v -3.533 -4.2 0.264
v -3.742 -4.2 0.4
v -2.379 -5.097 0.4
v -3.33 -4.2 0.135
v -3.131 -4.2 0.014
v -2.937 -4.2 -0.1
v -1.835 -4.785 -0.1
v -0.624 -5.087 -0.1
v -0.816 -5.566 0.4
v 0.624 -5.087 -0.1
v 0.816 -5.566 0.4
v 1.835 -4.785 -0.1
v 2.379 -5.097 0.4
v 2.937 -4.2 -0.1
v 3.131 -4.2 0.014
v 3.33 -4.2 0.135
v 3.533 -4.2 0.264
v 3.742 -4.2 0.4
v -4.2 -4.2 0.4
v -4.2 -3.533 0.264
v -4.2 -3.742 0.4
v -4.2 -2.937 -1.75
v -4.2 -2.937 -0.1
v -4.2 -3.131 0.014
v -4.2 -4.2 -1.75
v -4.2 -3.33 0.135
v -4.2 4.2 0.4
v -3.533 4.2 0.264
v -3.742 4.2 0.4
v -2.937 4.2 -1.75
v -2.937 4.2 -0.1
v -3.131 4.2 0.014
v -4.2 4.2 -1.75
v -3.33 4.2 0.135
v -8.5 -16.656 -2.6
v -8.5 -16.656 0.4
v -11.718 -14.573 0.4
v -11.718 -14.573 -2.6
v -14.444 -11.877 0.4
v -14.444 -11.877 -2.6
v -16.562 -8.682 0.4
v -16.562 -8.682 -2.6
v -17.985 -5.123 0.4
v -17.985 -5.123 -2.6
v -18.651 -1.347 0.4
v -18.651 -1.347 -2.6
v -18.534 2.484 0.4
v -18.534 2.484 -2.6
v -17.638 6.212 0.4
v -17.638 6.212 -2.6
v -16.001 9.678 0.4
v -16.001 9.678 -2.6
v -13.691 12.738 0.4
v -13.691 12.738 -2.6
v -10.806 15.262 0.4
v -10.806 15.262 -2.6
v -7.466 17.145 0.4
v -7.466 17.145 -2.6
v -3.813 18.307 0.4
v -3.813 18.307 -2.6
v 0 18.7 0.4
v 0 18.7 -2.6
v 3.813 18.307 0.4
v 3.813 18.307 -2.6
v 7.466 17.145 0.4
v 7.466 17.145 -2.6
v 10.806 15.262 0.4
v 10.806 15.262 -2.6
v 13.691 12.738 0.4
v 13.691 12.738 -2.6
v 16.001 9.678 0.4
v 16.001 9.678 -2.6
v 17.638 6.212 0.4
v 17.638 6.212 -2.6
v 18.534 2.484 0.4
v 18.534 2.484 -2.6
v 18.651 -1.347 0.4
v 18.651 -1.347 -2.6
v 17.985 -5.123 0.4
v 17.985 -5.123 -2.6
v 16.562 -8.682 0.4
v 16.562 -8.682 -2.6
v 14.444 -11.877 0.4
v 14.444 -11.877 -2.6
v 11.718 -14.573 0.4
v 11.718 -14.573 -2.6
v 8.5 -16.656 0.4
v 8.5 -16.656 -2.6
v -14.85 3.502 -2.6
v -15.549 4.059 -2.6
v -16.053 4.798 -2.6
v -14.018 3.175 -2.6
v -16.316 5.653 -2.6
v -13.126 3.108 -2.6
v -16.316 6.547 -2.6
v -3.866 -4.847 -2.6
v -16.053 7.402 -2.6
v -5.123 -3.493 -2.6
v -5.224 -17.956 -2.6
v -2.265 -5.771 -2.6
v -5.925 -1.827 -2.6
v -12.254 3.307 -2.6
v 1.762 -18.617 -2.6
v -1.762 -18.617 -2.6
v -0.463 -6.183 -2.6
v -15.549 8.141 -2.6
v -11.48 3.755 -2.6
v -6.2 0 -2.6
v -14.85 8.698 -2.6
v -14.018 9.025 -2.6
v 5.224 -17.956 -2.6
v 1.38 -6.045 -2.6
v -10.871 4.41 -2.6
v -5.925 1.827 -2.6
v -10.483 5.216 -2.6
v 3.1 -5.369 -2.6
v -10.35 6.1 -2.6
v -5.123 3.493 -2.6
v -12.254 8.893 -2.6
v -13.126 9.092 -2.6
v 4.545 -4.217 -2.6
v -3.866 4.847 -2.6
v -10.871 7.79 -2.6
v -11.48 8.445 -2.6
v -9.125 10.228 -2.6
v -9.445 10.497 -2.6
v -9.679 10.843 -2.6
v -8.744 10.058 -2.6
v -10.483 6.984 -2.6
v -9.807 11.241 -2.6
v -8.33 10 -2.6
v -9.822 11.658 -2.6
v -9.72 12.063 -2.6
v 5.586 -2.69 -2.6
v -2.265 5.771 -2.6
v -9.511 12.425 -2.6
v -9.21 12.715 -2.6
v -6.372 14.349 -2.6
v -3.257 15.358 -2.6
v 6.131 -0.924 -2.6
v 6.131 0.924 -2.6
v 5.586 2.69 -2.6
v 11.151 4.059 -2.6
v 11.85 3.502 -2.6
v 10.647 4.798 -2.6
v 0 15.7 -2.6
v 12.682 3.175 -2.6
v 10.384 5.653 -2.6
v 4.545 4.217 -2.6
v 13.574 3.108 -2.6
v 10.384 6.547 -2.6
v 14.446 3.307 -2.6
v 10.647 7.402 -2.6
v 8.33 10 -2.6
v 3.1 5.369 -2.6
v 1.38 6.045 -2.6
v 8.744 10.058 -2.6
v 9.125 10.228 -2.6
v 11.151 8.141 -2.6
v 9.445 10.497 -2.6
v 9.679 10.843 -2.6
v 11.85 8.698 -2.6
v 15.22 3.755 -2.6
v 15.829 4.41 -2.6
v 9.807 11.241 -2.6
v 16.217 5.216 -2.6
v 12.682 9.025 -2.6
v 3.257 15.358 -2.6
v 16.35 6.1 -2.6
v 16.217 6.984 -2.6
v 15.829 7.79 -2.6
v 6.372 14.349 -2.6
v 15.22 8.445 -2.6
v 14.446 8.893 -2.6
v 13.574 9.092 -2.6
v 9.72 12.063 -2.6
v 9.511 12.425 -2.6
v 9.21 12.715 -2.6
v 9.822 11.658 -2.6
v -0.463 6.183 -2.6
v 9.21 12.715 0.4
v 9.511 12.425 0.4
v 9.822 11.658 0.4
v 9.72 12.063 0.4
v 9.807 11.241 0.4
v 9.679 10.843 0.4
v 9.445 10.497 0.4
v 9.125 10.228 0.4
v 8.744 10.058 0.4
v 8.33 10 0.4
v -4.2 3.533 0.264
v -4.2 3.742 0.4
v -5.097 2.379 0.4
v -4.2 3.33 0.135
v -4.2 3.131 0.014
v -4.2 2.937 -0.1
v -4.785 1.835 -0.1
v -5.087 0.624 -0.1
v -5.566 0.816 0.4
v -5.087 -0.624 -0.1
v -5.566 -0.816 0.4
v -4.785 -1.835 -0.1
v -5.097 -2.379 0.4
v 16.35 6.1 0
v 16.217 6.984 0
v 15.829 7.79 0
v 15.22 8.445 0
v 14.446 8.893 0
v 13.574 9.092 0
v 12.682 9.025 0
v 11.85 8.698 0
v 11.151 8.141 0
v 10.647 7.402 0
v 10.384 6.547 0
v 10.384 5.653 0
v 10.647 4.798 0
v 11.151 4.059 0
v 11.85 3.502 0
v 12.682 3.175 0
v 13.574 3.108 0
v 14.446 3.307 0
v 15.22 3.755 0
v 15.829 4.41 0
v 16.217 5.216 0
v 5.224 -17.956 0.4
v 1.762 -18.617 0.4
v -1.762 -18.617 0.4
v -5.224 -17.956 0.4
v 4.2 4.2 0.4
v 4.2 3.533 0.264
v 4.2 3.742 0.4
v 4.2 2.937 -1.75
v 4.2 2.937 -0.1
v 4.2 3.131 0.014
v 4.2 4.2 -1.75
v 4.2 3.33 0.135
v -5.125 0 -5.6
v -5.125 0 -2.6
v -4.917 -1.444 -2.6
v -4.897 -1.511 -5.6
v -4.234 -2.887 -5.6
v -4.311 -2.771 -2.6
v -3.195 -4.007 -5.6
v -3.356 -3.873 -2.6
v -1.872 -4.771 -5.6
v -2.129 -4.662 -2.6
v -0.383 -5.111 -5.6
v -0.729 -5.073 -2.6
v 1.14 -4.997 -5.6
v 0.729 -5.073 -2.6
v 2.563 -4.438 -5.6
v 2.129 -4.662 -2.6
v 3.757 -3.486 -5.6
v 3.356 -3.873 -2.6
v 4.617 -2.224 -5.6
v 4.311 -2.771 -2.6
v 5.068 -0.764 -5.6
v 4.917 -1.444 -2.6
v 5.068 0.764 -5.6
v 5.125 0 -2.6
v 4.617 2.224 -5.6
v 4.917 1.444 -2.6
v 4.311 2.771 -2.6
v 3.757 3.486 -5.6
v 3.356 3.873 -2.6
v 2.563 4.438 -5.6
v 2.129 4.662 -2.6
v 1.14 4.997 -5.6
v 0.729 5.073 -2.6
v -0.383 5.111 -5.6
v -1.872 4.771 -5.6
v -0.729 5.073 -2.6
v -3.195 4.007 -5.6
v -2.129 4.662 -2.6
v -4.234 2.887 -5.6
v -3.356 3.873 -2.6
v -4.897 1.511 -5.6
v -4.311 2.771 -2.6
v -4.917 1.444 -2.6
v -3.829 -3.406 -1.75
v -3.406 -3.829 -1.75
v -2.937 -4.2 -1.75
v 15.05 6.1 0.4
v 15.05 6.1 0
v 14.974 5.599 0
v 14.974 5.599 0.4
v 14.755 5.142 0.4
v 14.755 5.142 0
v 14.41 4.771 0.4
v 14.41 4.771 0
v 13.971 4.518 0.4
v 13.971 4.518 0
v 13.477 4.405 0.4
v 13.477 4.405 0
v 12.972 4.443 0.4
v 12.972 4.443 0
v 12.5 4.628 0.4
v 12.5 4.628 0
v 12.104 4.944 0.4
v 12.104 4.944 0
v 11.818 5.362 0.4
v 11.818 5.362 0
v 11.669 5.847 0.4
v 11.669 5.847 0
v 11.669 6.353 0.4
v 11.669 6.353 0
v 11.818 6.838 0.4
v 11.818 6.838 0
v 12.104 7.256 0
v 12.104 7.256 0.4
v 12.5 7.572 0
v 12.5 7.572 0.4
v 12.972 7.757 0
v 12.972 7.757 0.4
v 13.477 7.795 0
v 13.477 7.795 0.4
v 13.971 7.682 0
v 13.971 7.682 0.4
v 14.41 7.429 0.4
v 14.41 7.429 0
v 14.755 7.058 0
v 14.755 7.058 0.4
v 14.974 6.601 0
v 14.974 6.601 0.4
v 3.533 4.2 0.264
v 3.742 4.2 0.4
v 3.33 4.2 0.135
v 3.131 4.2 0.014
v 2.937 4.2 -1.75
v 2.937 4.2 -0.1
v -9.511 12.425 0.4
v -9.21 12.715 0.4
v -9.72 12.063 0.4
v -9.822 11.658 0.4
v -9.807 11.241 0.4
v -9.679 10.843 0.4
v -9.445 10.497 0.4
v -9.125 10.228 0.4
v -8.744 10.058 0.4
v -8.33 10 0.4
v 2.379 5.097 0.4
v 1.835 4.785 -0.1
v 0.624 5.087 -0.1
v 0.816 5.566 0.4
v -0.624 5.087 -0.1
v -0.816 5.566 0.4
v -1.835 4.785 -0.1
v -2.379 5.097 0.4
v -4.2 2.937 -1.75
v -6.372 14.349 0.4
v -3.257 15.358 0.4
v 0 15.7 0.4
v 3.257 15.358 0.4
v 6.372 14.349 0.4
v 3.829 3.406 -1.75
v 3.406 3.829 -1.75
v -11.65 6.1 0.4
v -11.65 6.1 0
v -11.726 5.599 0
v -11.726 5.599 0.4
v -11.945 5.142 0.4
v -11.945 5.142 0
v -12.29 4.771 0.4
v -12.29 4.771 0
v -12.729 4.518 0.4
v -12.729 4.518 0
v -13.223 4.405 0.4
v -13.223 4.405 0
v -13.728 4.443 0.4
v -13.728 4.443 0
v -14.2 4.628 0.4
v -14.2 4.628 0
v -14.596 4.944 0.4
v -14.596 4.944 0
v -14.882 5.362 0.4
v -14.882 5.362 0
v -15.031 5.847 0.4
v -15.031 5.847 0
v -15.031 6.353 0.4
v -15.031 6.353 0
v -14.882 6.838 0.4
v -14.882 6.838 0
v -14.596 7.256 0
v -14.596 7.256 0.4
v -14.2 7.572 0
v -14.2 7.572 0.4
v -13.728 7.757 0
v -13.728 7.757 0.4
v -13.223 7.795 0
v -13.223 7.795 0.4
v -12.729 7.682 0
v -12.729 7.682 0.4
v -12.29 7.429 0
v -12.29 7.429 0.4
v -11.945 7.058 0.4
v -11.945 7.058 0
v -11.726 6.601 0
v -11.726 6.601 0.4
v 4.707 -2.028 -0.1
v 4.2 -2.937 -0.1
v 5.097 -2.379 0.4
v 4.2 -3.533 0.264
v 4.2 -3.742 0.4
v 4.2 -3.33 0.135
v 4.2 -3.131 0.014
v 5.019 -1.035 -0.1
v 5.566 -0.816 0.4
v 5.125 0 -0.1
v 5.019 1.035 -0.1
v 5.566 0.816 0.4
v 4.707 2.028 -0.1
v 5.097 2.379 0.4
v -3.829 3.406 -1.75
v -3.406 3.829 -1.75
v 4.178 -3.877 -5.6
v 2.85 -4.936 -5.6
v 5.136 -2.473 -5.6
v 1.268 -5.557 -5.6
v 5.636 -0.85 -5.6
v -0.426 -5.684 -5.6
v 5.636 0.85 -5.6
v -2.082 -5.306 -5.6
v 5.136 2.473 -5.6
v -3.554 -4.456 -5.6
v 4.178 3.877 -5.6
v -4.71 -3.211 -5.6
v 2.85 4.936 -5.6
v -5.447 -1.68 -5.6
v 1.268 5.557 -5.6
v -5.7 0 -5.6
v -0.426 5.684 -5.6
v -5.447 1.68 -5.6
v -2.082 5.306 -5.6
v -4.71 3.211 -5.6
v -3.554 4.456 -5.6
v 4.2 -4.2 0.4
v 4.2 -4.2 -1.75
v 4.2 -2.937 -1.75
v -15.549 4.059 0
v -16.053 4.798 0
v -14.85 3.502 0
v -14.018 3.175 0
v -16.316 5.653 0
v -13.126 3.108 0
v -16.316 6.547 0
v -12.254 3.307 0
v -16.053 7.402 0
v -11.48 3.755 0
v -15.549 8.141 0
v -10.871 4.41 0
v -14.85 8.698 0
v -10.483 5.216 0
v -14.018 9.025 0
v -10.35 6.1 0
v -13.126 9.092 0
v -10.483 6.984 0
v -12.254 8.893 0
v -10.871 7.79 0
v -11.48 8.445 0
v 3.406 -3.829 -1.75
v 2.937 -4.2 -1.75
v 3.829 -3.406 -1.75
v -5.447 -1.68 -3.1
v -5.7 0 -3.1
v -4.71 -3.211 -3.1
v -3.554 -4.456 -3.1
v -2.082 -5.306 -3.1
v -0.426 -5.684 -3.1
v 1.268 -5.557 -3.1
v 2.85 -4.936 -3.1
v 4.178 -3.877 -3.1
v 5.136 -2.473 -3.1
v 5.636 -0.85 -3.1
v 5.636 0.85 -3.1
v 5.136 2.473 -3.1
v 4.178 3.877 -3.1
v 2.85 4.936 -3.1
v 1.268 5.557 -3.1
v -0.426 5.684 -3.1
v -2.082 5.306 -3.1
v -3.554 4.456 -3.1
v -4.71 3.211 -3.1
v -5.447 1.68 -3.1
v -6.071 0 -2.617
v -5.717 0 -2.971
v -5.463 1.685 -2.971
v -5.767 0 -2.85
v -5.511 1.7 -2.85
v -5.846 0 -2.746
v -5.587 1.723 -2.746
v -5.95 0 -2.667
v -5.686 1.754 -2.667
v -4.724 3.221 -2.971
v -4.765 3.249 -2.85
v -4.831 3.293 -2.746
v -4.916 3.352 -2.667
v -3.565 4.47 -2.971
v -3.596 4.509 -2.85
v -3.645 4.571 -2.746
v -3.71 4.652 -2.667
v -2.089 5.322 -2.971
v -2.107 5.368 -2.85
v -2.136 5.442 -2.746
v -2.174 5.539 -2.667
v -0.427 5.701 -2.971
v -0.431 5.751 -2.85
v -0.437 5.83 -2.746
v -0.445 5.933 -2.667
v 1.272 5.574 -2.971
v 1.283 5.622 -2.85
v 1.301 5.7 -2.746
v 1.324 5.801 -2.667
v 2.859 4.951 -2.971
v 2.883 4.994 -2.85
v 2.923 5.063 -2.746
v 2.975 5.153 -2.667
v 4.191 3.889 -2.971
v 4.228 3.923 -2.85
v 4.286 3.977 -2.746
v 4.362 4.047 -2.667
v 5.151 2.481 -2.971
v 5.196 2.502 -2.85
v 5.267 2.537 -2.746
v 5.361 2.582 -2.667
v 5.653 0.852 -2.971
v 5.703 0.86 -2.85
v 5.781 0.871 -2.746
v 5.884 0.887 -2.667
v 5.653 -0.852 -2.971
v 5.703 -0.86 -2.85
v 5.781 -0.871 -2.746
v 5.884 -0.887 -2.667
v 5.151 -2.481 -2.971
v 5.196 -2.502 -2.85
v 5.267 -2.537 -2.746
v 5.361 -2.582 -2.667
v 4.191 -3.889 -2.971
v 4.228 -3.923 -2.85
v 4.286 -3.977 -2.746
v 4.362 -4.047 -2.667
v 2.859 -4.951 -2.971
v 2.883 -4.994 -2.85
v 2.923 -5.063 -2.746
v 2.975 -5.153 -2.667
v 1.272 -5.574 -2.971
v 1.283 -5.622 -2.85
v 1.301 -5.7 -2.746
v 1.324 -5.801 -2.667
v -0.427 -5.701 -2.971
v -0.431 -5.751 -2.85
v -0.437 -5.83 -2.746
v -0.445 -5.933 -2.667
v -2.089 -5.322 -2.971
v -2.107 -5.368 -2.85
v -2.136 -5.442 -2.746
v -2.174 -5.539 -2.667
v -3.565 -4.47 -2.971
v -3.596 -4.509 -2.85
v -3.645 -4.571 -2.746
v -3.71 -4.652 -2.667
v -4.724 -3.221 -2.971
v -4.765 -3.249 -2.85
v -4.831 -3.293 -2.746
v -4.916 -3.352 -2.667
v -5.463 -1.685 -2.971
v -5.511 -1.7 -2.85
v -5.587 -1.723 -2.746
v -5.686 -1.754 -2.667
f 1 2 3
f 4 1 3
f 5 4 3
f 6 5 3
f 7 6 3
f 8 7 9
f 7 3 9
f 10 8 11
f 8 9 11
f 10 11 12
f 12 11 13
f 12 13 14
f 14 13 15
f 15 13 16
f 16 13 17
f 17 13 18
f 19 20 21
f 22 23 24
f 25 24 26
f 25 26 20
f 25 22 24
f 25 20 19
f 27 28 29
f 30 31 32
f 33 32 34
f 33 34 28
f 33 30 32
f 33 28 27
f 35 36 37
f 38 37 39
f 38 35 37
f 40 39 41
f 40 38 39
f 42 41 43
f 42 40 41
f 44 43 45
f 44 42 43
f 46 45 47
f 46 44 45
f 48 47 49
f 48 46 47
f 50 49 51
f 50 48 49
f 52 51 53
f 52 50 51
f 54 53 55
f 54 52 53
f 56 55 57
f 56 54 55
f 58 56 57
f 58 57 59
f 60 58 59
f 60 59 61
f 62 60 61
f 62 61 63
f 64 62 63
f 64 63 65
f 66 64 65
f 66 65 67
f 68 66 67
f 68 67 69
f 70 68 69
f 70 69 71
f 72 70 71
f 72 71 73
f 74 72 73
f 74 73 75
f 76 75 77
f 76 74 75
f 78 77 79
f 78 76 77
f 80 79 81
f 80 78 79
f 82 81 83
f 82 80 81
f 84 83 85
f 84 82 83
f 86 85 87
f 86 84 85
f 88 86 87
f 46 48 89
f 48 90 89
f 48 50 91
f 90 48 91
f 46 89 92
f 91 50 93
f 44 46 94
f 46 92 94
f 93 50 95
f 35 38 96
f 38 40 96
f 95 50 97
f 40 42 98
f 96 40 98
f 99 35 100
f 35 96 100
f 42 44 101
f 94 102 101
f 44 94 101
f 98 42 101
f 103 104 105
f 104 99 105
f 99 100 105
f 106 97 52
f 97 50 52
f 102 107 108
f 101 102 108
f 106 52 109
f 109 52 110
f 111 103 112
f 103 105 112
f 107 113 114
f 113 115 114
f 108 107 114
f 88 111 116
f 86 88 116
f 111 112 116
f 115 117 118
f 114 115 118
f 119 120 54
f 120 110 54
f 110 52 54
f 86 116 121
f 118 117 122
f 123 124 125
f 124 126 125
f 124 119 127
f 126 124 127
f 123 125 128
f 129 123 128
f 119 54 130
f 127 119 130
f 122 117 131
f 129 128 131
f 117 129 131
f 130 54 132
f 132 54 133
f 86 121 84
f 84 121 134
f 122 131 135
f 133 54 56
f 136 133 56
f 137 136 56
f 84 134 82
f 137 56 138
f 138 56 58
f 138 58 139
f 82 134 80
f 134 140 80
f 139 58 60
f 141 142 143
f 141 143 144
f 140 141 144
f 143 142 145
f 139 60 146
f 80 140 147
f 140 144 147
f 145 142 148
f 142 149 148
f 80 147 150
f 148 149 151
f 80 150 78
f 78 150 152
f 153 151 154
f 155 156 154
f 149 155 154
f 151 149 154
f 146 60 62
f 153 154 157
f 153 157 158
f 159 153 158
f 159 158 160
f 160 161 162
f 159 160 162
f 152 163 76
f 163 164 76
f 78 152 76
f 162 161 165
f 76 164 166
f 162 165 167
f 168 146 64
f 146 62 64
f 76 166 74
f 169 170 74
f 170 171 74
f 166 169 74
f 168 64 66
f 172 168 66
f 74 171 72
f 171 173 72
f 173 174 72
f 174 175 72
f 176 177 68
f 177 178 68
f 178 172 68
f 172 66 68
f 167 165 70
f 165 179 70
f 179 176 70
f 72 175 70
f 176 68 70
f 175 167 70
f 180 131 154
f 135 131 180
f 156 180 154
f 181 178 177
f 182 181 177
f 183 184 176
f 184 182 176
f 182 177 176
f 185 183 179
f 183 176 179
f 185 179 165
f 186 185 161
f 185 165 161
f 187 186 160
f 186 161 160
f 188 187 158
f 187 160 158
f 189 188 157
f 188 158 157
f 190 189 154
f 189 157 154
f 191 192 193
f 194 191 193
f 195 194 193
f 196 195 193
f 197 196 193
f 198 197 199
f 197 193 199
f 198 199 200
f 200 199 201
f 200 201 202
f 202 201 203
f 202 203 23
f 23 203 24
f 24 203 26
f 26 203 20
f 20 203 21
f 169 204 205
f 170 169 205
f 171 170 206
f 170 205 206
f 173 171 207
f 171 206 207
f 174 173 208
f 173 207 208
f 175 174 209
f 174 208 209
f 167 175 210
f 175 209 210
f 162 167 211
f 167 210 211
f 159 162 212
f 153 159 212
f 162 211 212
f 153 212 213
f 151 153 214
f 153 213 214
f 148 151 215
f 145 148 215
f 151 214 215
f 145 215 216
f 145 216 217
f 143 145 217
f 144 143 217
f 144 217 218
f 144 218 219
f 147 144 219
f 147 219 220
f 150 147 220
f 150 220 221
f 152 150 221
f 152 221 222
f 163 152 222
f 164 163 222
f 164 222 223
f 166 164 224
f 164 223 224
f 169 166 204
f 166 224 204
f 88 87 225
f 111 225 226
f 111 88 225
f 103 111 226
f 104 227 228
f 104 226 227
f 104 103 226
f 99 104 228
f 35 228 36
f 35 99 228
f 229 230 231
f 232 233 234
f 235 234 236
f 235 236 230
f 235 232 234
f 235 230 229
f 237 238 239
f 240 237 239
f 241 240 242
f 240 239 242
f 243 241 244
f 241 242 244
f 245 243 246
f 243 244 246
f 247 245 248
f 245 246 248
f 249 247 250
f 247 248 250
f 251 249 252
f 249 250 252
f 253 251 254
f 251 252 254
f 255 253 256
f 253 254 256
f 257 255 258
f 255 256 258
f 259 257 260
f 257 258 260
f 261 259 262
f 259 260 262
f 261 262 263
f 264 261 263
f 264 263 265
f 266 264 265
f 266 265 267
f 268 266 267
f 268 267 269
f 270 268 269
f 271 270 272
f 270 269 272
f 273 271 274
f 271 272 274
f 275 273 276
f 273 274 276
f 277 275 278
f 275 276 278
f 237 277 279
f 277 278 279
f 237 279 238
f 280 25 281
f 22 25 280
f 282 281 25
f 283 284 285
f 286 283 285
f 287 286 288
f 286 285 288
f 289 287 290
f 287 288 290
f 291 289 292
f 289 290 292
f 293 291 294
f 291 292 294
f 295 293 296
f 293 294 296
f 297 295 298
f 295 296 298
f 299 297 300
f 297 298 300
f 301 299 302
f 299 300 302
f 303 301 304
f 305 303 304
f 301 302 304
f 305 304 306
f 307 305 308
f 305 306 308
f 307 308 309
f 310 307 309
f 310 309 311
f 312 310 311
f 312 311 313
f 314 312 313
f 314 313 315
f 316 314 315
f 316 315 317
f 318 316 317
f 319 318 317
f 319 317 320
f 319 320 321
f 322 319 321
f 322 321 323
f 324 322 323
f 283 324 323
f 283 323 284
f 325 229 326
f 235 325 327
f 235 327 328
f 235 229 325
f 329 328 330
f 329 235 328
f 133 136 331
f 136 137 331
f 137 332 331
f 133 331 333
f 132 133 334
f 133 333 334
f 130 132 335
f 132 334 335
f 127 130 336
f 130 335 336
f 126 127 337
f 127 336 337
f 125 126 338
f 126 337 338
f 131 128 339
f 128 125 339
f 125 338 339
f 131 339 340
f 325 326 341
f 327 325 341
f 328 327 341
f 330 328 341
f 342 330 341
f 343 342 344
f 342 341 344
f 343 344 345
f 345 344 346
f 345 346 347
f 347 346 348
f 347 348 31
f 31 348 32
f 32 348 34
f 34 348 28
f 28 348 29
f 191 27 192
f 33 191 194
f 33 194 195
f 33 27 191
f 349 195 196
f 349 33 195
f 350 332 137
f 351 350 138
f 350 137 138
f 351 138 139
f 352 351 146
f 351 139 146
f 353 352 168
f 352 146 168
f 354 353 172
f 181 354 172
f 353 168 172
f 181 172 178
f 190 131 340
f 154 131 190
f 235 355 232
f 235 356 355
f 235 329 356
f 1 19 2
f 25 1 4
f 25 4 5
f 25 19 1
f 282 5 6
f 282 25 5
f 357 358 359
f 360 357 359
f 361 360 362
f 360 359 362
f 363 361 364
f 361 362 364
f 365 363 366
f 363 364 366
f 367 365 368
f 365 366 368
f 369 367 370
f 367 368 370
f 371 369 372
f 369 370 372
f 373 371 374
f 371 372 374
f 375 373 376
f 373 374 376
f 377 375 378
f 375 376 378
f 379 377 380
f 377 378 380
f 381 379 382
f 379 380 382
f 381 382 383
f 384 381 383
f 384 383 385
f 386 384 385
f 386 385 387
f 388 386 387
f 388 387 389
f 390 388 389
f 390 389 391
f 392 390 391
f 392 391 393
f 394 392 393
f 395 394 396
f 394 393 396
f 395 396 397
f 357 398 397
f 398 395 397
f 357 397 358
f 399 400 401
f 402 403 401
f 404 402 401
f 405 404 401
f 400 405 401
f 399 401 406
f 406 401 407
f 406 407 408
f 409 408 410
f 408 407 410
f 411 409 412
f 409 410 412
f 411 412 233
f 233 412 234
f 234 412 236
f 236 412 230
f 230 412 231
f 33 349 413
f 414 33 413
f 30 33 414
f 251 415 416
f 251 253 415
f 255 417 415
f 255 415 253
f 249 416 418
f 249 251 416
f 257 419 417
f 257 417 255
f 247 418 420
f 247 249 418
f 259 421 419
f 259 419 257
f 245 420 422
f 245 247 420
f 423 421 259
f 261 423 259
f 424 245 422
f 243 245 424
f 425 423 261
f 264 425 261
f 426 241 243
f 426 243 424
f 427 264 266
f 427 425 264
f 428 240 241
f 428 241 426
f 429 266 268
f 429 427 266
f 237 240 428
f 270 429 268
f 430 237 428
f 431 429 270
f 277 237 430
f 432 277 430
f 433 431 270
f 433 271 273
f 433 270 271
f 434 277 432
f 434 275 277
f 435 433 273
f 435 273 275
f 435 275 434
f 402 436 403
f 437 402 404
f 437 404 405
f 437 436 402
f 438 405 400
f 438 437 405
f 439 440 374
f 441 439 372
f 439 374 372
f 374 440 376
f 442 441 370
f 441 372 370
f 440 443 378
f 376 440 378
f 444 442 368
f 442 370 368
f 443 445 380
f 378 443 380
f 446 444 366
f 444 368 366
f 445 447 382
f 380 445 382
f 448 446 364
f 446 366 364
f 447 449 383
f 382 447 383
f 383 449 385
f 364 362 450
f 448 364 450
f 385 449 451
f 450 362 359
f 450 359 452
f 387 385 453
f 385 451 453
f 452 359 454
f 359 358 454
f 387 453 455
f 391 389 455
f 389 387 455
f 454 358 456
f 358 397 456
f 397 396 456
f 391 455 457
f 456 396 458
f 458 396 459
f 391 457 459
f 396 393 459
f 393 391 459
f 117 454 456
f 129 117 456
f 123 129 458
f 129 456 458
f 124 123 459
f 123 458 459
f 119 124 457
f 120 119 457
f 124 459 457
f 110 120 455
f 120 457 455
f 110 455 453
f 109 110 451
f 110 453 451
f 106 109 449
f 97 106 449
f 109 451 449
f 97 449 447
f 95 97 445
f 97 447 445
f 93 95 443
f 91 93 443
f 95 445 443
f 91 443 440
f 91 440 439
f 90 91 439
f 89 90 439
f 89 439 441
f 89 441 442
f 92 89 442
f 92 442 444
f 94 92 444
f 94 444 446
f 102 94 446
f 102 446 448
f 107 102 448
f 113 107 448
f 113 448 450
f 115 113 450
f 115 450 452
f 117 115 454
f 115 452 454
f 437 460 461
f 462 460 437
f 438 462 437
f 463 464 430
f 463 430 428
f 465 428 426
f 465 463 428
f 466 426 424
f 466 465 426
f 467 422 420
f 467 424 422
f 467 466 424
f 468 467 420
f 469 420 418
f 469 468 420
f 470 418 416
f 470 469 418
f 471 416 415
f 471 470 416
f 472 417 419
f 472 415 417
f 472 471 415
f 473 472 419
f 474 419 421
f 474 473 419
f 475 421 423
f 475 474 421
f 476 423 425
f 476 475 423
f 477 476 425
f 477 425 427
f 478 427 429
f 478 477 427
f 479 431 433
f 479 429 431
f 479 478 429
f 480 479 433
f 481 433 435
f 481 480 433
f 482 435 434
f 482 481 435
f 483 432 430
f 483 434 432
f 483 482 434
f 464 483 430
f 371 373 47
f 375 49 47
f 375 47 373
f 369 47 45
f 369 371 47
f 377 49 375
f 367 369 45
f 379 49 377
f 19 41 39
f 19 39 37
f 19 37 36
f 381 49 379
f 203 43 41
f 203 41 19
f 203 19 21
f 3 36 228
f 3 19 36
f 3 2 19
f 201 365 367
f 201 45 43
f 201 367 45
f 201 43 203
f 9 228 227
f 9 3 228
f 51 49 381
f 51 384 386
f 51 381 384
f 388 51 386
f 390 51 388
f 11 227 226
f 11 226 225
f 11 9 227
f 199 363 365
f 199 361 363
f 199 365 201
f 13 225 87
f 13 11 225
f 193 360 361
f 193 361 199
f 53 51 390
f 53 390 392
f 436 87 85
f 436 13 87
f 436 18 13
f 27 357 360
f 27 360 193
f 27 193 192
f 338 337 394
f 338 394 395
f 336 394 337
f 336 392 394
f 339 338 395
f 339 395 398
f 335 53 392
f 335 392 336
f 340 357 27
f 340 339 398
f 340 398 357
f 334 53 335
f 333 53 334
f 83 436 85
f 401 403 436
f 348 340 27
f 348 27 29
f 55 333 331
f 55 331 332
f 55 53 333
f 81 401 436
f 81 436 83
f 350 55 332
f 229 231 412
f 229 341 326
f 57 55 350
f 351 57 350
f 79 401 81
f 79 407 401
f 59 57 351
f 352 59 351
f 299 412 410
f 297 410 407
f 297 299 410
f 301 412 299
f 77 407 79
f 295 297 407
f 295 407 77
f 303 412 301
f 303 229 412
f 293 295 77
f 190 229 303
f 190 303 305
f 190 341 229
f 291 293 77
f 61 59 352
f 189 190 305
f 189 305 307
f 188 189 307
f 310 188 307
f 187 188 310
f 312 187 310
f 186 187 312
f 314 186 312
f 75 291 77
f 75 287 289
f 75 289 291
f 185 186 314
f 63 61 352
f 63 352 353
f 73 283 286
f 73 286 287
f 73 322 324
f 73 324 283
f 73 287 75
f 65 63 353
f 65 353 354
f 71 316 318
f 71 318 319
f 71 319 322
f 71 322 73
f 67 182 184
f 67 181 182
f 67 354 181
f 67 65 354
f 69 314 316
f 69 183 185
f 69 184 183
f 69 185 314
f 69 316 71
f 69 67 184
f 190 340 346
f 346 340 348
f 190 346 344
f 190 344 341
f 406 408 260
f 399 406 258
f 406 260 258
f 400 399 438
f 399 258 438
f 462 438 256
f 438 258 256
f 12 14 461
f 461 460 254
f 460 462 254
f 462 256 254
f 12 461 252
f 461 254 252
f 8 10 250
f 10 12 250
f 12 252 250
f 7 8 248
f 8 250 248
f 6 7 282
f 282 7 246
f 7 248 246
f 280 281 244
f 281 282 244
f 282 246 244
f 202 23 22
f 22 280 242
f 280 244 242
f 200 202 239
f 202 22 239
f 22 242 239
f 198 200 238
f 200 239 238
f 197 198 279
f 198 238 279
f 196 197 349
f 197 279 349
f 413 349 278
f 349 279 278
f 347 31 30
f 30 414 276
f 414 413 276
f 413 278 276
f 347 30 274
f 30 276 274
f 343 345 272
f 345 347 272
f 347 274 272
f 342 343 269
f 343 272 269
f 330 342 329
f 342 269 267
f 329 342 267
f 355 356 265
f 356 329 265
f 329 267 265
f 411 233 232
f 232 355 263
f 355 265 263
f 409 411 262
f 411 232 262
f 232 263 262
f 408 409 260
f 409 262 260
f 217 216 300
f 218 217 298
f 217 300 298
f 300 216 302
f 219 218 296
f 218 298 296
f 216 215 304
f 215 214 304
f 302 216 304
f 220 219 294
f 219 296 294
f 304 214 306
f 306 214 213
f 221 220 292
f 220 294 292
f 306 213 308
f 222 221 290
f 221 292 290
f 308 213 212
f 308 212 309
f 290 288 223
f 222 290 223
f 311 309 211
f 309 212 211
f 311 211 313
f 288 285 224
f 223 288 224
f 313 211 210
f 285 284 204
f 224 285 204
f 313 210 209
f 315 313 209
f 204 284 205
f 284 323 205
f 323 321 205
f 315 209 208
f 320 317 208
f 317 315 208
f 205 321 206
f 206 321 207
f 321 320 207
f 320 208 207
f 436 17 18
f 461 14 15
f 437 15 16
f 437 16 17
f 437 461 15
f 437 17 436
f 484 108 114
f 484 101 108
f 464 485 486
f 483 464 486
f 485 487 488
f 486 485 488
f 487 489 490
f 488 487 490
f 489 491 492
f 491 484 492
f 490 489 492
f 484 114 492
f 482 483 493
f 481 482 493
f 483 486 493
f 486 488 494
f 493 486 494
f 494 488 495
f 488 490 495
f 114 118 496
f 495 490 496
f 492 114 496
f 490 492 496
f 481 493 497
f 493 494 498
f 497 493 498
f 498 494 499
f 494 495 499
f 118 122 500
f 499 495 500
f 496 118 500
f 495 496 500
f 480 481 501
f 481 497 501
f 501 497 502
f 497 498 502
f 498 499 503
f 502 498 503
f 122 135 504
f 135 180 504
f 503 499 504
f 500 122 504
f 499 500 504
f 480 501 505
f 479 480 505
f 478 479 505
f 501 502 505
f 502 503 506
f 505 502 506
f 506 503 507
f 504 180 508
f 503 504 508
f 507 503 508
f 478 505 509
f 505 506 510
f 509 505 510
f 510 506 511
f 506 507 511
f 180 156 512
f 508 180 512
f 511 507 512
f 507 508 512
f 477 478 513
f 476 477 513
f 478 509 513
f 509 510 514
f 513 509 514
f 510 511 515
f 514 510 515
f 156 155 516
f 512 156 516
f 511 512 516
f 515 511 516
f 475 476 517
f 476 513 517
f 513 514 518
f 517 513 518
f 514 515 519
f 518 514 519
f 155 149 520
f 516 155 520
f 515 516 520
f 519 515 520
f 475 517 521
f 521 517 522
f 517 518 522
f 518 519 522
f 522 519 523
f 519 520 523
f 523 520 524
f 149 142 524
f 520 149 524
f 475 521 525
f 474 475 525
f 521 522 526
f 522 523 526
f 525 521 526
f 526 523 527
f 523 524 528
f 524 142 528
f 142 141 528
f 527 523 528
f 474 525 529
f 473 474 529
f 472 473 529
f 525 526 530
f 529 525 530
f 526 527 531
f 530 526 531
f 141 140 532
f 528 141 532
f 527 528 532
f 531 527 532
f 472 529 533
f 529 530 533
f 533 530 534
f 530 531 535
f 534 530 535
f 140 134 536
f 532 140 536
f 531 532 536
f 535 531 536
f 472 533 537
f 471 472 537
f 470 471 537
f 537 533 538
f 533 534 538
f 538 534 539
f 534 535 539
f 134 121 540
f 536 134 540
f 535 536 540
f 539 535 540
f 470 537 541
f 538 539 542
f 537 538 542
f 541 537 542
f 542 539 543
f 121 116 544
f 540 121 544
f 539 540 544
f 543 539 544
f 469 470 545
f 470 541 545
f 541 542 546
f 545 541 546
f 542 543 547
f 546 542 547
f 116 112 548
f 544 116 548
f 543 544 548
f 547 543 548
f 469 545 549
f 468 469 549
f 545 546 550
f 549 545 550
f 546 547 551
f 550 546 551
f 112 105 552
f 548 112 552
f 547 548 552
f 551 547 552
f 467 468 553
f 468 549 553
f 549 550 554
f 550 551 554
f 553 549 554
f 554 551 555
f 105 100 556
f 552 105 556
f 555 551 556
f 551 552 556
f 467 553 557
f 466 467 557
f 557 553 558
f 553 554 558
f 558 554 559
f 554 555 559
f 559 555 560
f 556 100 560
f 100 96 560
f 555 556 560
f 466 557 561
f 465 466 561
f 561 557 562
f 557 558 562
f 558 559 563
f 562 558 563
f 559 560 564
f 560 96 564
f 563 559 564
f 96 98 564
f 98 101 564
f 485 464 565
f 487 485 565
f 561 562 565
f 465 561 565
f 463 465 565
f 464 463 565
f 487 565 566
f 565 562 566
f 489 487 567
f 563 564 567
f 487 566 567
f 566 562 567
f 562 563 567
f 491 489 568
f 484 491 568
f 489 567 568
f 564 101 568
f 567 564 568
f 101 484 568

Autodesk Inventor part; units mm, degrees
ref_plane "YZ Plane" through (0, 0, 0) normal (1, 0, 0) x (0, 1, 0)
ref_plane "XZ Plane" through (0, 0, 0) normal (0, 1, 0) x (-1, 0, 0)
ref_plane "XY Plane" through (0, 0, 0) normal (0, 0, 1) x (1, 0, 0)
sketch "Náčrt1" plane through (0, 0, 0) normal (0, 0, 1) x (1, 0, 0)
  circle A0 centre (0, 0) radius 5.125
  arc A1 (8.5, -16.6565) -> (-8.5, -16.6565) centre (0, 0) ccw
  line L0 (-13.35, 6.1) -> (13.35, 6.1)
  line L1 (0, 18.7) -> (0, -18.7)
  line L2 (8.5, -16.6565) -> (8.5, -22.2)
  line L3 (8.5, -22.2) -> (-8.5, -22.2)
  line L4 (-8.5, -22.2) -> (-8.5, -16.6565)
  line L5 (0, -18.7) -> (8.5, -22.2) construction
  line L6 (0, -18.7) -> (-8.5, -22.2) construction
  circle A2 centre (-13.35, 6.1) radius 1.7
  circle A3 centre (13.35, 6.1) radius 1.7
  line L7 (-12.1033, 10) -> (12.1033, 10)
  arc A4 (12.1033, 10) -> (-12.1033, 10) centre (0, 0) ccw
  line L8 (4.2, 4.2) -> (-4.2, 4.2)
  line L9 (-4.2, 4.2) -> (-4.2, -4.2)
  line L10 (-4.2, -4.2) -> (4.2, -4.2)
  line L11 (4.2, -4.2) -> (4.2, 4.2)
  line L12 (4.2, 4.2) -> (-4.2, -4.2) construction
  line L13 (-4.2, 4.2) -> (4.2, -4.2) construction
  line L14 (-3.55, -20.2) -> (3.55, -20.2)
  line L15 (3.55, -20.2) -> (3.55, -17.1)
  line L16 (3.55, -17.1) -> (-3.55, -17.1)
  line L17 (-3.55, -17.1) -> (-3.55, -20.2)
  line L18 (-3.55, -20.2) -> (3.55, -17.1) construction
  line L19 (3.55, -20.2) -> (-3.55, -17.1) construction
  circle A5 centre (0, 0) radius 5.575
  circle A6 centre (0, 0) radius 18.7
  circle A7 centre (-13.35, 6.1) radius 3
  circle A8 centre (13.35, 6.1) radius 3
  point P0 (-10.088, 6.1)
  point P1 (4.2, -2.9369)
  point P2 (2.9369, -4.2)
  point P3 (-2.9369, -4.2)
  point P4 (-4.2, -2.9369)
  point P5 (-4.2, 2.9369)
  point P6 (-2.9369, 4.2)
  point P7 (4.2, 2.9369)
  point P8 (2.9369, 4.2)
  point P9 (0, -18.65)
  point P10 (-8.5, -16.6565)
  dimension "d0" = 10.25
  dimension "d1" = 37.4
  dimension "d2" = 26.7
  dimension "d3" = 17
  dimension "d5" = 22.2
  dimension "d7" = 6.1
  dimension "d9" = 3.4
  dimension "d10" = 3.4
  dimension "d12" = 10
  dimension "d14" = 3
  dimension "d25" = 8.4
  dimension "d26" = 8.4
  dimension "d31" = 3.1
  dimension "d32" = 7.1
  dimension "d33" = 2
  dimension "d39" = 0.45
  dimension "d40" = 6
  dimension "d41" = 6
extrude "Vysunutí1" add sketch "Náčrt1" along normal blind 0.4 contours A0 L11 A5 | A0 L8 A5 L11 | L11 A5 L10 A0 | A0 L1 A5 L8 | A5 L8 L11 | L11 L8 A5 L1 L7 A4 A1 A6 L15 L16 L10 | L10 A5 L1 A0 | L11 L10 A5 | A0 L8 A5 L1 | L1 A5 L10 A0 | A0 L9 A5 L8 | A5 L8 L9 L10 L1 L16 L17 A6 A1 A4 L7 | L10 A5 L9 A0 | A0 L9 A5 | A5 L9 L8 | L10 L9 A5 | L16 L15 A6 L1 | L1 A6 L17 L16 | A7 | A8
extrude "Vysunutí2" add sketch "Náčrt1" against normal blind 2.6 contours A0 L11 A5 | A0 L8 A5 L11 | L11 A5 L10 A0 | A0 L1 A5 L8 | A5 L8 L11 | L11 L8 A5 L1 L7 A4 A1 A6 L15 L16 L10 | L10 A5 L1 A0 | L11 L10 A5 | A0 L8 A5 L1 | L1 A5 L10 A0 | A0 L9 A5 L8 | A5 L8 L9 L10 L1 L16 L17 A6 A1 A4 L7 | L10 A5 L9 A0 | A0 L9 A5 | A5 L9 L8 | L10 L9 A5 | L16 L15 A6 L1 | L1 A6 L17 L16
fillet "Zaoblení1" radius 1.5 4 edges at (12.1033, 10, 0.2) (12.1033, 10, -1.3) (-12.1033, 10, 0.2) (-12.1033, 10, -1.3)
chamfer "Zkosení1" distance 0.5 angle 45 1 edges at (-5.125, 0, 0.4)
extrude "Vysunutí3" cut sketch "Náčrt1" along normal blind 0.75 and the other way blind 1.75 contours A0 L8 A5 L11 | L11 A5 L10 A0 | A5 L8 L11 | L11 L10 A5 | A0 L9 A5 L8 | L10 A5 L9 A0 | A5 L9 L8 | L10 L9 A5
sketch "Náčrt2" plane through (0, 0, -2.6) normal (0, 0, -1) x (-1, 0, 0)
  circle A0 centre (0, 0) radius 5.125 projected
  circle A1 centre (0, 0) radius 5.7
  dimension "d35" = 11.4
extrude "Vysunutí4" add sketch "Náčrt2" along normal blind 3
fillet "Zaoblení4" radius 0.5 1 edges at (5.7, 0, -2.6)
properties part number "Držák-Cam+ir"
